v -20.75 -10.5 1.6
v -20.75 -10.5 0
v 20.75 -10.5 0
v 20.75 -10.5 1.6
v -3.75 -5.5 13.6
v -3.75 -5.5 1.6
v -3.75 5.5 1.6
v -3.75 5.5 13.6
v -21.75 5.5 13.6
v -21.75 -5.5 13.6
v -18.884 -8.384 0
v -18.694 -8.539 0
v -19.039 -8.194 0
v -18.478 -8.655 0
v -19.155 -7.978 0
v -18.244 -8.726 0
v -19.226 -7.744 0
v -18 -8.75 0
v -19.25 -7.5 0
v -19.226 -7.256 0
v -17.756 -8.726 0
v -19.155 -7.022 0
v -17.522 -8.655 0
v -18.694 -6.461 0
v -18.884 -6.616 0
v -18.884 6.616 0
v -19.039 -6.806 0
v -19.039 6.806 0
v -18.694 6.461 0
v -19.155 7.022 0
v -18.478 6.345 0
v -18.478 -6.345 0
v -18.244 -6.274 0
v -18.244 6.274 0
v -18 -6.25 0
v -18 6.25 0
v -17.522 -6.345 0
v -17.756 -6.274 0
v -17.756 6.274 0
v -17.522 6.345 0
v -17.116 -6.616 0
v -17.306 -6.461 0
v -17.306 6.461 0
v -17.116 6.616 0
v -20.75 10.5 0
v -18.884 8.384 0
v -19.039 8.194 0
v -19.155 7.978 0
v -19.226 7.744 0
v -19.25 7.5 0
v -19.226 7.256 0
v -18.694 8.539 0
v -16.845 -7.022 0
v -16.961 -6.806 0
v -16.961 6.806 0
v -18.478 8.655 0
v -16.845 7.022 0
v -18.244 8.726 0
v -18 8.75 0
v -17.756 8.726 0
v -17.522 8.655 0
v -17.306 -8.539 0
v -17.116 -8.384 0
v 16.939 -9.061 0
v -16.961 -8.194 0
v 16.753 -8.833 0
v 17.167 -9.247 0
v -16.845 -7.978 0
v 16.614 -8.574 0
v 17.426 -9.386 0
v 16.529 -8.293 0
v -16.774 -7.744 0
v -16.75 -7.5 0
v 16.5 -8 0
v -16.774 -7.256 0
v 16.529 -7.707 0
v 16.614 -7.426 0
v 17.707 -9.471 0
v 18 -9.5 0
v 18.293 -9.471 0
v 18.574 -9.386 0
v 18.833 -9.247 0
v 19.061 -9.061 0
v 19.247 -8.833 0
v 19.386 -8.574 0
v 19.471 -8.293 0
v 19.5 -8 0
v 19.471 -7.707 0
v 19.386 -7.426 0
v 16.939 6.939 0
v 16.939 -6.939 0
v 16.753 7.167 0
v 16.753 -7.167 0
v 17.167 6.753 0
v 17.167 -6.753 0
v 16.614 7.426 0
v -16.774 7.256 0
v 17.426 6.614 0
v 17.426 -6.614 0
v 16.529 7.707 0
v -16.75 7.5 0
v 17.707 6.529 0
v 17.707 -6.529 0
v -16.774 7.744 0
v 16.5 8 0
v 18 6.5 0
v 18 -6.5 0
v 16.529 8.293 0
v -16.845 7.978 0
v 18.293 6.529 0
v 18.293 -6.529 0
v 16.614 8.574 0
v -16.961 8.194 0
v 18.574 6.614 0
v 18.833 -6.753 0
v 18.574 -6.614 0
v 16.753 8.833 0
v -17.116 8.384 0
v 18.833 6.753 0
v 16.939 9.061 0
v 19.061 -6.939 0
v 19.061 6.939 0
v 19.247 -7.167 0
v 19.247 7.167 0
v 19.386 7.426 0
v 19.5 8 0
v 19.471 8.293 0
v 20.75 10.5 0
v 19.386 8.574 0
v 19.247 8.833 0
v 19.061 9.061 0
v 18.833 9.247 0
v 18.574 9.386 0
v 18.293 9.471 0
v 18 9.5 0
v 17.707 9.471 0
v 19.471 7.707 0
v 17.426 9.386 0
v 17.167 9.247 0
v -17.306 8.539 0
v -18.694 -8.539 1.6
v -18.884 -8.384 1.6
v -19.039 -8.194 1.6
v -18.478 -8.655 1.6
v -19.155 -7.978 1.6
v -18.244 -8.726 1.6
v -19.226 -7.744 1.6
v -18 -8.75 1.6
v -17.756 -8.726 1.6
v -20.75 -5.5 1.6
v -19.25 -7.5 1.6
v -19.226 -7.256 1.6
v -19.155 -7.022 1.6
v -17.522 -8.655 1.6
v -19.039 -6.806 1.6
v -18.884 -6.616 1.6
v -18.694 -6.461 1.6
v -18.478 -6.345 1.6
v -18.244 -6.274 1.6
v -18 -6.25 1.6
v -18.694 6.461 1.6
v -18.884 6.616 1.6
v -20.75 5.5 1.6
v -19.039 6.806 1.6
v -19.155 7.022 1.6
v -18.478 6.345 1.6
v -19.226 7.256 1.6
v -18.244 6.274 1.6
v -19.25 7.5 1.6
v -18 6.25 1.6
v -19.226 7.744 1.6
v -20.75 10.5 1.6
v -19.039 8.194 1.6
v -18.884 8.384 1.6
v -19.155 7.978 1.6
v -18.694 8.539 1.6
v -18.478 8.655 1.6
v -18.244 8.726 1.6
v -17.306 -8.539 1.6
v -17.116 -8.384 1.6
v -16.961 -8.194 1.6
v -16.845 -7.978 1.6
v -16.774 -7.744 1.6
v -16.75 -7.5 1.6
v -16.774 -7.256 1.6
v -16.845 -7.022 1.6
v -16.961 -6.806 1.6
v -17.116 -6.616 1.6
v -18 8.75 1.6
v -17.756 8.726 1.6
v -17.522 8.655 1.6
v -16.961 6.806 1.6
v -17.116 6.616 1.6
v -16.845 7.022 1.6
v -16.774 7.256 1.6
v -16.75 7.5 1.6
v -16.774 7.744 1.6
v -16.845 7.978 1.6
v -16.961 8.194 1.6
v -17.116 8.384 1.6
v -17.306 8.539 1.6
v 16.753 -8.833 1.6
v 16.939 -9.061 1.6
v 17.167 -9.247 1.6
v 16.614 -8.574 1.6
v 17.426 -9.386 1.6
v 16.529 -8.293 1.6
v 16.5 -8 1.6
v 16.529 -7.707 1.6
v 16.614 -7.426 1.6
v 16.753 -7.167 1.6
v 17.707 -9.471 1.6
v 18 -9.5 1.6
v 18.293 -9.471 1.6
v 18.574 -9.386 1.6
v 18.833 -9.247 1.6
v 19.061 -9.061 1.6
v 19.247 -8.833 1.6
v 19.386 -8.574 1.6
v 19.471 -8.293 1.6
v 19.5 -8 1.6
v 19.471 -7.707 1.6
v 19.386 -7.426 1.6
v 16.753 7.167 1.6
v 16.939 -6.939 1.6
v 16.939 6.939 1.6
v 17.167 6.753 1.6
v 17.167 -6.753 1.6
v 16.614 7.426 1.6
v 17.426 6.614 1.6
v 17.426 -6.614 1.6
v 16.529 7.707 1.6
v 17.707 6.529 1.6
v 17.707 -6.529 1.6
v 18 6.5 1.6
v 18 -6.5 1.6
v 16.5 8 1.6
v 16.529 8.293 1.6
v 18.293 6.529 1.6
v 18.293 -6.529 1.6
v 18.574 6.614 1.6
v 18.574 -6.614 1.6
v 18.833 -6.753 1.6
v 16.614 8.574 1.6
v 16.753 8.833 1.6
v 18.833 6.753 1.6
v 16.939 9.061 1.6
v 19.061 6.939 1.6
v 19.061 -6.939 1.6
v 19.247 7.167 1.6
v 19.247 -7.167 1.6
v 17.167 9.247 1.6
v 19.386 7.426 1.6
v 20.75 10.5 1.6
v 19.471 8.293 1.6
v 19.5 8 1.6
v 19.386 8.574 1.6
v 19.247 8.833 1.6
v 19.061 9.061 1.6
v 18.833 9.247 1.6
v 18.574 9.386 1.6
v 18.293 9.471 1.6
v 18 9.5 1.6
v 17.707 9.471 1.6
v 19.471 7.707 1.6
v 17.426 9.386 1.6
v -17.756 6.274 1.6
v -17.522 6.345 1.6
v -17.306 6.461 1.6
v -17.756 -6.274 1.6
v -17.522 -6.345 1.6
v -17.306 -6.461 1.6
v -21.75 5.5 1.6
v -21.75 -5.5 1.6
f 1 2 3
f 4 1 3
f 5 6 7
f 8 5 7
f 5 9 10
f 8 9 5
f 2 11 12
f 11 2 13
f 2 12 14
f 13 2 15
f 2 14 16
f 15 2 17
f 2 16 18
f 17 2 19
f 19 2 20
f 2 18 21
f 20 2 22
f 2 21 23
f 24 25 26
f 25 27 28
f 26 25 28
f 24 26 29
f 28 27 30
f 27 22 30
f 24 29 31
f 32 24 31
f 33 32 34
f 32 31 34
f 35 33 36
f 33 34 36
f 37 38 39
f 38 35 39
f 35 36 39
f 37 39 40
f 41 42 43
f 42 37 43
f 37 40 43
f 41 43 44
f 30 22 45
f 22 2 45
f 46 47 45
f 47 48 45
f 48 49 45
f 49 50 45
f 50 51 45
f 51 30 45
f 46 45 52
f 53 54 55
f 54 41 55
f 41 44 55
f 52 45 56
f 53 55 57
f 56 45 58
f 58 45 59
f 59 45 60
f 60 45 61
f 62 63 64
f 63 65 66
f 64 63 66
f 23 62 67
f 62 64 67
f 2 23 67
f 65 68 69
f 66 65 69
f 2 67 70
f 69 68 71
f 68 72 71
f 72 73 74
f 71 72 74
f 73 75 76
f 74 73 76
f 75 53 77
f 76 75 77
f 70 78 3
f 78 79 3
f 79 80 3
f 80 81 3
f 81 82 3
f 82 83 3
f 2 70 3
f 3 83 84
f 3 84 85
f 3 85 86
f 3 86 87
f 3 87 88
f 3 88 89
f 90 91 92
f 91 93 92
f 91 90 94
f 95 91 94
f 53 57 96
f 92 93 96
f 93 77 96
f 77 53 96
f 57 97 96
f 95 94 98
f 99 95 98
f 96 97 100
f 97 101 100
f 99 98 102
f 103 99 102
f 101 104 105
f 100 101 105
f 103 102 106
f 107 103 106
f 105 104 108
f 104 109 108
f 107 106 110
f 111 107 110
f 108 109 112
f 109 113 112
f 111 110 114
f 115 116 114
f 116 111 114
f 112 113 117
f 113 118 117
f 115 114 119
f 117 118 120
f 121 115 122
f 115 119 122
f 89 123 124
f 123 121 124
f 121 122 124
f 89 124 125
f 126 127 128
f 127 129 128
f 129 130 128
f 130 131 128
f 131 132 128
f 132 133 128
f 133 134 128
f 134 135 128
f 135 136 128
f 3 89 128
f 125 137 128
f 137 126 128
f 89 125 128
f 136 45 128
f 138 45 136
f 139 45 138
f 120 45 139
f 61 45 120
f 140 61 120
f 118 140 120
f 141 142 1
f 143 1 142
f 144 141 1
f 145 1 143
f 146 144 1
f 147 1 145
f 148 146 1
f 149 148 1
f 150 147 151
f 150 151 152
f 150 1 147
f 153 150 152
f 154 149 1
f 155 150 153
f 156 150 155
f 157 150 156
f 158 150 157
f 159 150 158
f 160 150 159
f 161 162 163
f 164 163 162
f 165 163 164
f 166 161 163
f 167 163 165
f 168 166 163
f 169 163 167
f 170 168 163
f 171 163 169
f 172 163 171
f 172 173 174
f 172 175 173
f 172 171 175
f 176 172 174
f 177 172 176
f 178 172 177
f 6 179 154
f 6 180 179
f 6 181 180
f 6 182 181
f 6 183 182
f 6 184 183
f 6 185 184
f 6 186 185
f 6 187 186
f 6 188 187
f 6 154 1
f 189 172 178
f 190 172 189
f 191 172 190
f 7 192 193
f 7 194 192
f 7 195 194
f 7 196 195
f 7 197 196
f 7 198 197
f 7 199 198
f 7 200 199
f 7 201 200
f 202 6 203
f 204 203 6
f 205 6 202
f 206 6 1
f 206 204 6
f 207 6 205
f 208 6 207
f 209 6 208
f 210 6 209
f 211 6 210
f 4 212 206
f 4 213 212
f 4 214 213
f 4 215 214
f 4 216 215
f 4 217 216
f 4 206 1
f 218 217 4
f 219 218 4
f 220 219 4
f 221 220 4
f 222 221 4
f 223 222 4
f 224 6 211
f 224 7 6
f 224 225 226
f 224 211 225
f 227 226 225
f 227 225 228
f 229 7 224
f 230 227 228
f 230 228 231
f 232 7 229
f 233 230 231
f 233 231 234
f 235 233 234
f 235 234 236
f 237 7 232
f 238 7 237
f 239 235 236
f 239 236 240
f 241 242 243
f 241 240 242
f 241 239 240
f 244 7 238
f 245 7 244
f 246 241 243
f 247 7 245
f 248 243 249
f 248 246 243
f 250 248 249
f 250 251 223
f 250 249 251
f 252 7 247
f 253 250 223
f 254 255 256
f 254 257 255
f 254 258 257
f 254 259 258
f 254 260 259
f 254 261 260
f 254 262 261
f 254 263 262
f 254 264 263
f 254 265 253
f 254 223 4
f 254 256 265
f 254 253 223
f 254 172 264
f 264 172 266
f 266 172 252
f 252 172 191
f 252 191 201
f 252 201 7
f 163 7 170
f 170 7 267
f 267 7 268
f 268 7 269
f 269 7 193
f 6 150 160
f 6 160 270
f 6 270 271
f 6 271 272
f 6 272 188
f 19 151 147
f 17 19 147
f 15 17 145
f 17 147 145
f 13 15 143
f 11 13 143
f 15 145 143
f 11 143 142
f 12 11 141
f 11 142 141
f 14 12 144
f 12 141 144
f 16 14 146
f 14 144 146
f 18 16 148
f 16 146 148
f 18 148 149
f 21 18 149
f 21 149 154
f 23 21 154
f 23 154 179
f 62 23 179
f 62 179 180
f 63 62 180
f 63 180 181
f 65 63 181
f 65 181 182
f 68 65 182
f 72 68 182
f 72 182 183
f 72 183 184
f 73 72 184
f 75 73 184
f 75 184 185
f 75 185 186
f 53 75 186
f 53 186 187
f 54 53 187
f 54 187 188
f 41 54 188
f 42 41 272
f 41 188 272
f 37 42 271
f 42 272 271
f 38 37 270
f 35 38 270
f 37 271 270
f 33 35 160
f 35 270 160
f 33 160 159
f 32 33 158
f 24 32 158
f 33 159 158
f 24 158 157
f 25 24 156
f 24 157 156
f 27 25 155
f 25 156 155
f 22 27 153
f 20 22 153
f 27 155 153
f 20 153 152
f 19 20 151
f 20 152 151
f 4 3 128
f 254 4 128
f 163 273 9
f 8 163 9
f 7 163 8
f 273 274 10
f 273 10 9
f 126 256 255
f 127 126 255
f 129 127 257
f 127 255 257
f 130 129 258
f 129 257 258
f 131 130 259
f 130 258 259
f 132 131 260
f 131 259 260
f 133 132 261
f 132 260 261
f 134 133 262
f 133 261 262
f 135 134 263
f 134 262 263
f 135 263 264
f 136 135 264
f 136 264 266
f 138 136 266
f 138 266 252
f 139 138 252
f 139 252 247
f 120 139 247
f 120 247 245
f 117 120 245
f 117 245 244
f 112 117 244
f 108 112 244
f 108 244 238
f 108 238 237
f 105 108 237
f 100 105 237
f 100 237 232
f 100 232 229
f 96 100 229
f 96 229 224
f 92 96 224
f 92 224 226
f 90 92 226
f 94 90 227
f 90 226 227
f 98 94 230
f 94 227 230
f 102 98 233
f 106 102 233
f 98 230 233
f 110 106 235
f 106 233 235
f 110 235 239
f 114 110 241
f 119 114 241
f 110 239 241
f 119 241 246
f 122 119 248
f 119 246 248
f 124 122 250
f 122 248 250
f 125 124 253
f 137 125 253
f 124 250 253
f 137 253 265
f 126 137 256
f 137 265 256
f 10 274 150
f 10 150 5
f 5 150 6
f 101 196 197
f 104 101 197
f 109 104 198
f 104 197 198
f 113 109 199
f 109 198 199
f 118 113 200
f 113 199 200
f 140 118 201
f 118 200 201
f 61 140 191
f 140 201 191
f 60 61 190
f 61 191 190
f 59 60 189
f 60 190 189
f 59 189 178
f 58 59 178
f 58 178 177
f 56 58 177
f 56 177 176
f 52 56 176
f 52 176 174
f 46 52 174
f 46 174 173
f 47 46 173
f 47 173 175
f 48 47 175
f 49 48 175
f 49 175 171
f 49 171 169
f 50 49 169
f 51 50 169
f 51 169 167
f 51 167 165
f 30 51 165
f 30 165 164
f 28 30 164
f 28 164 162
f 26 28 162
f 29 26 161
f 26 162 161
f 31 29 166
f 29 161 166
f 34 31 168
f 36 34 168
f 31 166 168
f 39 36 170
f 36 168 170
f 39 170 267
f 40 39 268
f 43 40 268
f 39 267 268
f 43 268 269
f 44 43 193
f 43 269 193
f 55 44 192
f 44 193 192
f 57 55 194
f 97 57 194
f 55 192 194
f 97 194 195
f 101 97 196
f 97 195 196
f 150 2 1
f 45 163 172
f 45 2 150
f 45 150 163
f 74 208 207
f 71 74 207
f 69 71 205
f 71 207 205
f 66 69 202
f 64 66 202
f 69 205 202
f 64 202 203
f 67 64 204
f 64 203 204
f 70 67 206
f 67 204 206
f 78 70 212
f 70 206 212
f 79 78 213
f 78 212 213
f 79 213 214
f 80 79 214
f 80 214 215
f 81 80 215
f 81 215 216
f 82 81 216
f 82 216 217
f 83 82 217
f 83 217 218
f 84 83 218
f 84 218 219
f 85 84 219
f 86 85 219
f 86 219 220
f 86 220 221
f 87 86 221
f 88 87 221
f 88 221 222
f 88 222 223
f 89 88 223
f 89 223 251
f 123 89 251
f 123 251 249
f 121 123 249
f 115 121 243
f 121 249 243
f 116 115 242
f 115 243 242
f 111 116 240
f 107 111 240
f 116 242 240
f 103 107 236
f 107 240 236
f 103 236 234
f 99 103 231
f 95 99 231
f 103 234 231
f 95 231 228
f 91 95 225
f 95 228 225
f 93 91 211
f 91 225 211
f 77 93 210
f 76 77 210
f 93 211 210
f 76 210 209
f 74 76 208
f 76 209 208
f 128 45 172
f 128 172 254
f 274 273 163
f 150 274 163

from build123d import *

# Parameters (mm, degrees)
SKETCH_1_W             = 41.5
SKETCH_1_H             = 21
EXTRUDE_346_DEPTH      = 1.6
SKETCH_2_W             = 18
SKETCH_2_H             = 11
RJ_9_DEPTH             = 12
SKETCH_3_R             = 1.25
SKETCH_3_R_2           = 1.5
CUT_EXTRUDE_1006_DEPTH = 27.968731895


with BuildPart() as part:
    # Эскиз1 → Extrude 346 (new body)
    with BuildSketch(Plane.XY):
        Rectangle(SKETCH_1_W, SKETCH_1_H)
    extrude(amount=EXTRUDE_346_DEPTH)

    # Эскиз2 → RJ-9 (add)
    with BuildSketch(Plane.XY.offset(1.6)):
        with Locations((-12.75, 0)):
            Rectangle(SKETCH_2_W, SKETCH_2_H)
    extrude(amount=RJ_9_DEPTH)

    # Эскиз3 → Cut-Extrude 1006 (cut, through all)
    with BuildSketch(Plane.XY.offset(1.6)):
        with Locations((-18, 7.5)):
            Circle(SKETCH_3_R)
        with Locations((18, 8)):
            Circle(SKETCH_3_R_2)
        with Locations(Location((18, -8, 0), (0, 0, 180))):
            Circle(SKETCH_3_R_2)
        with Locations(Location((-18, -7.5, 0), (0, 0, 180))):
            Circle(SKETCH_3_R)
    extrude(amount=-CUT_EXTRUDE_1006_DEPTH, mode=Mode.SUBTRACT)


solid = part.part
